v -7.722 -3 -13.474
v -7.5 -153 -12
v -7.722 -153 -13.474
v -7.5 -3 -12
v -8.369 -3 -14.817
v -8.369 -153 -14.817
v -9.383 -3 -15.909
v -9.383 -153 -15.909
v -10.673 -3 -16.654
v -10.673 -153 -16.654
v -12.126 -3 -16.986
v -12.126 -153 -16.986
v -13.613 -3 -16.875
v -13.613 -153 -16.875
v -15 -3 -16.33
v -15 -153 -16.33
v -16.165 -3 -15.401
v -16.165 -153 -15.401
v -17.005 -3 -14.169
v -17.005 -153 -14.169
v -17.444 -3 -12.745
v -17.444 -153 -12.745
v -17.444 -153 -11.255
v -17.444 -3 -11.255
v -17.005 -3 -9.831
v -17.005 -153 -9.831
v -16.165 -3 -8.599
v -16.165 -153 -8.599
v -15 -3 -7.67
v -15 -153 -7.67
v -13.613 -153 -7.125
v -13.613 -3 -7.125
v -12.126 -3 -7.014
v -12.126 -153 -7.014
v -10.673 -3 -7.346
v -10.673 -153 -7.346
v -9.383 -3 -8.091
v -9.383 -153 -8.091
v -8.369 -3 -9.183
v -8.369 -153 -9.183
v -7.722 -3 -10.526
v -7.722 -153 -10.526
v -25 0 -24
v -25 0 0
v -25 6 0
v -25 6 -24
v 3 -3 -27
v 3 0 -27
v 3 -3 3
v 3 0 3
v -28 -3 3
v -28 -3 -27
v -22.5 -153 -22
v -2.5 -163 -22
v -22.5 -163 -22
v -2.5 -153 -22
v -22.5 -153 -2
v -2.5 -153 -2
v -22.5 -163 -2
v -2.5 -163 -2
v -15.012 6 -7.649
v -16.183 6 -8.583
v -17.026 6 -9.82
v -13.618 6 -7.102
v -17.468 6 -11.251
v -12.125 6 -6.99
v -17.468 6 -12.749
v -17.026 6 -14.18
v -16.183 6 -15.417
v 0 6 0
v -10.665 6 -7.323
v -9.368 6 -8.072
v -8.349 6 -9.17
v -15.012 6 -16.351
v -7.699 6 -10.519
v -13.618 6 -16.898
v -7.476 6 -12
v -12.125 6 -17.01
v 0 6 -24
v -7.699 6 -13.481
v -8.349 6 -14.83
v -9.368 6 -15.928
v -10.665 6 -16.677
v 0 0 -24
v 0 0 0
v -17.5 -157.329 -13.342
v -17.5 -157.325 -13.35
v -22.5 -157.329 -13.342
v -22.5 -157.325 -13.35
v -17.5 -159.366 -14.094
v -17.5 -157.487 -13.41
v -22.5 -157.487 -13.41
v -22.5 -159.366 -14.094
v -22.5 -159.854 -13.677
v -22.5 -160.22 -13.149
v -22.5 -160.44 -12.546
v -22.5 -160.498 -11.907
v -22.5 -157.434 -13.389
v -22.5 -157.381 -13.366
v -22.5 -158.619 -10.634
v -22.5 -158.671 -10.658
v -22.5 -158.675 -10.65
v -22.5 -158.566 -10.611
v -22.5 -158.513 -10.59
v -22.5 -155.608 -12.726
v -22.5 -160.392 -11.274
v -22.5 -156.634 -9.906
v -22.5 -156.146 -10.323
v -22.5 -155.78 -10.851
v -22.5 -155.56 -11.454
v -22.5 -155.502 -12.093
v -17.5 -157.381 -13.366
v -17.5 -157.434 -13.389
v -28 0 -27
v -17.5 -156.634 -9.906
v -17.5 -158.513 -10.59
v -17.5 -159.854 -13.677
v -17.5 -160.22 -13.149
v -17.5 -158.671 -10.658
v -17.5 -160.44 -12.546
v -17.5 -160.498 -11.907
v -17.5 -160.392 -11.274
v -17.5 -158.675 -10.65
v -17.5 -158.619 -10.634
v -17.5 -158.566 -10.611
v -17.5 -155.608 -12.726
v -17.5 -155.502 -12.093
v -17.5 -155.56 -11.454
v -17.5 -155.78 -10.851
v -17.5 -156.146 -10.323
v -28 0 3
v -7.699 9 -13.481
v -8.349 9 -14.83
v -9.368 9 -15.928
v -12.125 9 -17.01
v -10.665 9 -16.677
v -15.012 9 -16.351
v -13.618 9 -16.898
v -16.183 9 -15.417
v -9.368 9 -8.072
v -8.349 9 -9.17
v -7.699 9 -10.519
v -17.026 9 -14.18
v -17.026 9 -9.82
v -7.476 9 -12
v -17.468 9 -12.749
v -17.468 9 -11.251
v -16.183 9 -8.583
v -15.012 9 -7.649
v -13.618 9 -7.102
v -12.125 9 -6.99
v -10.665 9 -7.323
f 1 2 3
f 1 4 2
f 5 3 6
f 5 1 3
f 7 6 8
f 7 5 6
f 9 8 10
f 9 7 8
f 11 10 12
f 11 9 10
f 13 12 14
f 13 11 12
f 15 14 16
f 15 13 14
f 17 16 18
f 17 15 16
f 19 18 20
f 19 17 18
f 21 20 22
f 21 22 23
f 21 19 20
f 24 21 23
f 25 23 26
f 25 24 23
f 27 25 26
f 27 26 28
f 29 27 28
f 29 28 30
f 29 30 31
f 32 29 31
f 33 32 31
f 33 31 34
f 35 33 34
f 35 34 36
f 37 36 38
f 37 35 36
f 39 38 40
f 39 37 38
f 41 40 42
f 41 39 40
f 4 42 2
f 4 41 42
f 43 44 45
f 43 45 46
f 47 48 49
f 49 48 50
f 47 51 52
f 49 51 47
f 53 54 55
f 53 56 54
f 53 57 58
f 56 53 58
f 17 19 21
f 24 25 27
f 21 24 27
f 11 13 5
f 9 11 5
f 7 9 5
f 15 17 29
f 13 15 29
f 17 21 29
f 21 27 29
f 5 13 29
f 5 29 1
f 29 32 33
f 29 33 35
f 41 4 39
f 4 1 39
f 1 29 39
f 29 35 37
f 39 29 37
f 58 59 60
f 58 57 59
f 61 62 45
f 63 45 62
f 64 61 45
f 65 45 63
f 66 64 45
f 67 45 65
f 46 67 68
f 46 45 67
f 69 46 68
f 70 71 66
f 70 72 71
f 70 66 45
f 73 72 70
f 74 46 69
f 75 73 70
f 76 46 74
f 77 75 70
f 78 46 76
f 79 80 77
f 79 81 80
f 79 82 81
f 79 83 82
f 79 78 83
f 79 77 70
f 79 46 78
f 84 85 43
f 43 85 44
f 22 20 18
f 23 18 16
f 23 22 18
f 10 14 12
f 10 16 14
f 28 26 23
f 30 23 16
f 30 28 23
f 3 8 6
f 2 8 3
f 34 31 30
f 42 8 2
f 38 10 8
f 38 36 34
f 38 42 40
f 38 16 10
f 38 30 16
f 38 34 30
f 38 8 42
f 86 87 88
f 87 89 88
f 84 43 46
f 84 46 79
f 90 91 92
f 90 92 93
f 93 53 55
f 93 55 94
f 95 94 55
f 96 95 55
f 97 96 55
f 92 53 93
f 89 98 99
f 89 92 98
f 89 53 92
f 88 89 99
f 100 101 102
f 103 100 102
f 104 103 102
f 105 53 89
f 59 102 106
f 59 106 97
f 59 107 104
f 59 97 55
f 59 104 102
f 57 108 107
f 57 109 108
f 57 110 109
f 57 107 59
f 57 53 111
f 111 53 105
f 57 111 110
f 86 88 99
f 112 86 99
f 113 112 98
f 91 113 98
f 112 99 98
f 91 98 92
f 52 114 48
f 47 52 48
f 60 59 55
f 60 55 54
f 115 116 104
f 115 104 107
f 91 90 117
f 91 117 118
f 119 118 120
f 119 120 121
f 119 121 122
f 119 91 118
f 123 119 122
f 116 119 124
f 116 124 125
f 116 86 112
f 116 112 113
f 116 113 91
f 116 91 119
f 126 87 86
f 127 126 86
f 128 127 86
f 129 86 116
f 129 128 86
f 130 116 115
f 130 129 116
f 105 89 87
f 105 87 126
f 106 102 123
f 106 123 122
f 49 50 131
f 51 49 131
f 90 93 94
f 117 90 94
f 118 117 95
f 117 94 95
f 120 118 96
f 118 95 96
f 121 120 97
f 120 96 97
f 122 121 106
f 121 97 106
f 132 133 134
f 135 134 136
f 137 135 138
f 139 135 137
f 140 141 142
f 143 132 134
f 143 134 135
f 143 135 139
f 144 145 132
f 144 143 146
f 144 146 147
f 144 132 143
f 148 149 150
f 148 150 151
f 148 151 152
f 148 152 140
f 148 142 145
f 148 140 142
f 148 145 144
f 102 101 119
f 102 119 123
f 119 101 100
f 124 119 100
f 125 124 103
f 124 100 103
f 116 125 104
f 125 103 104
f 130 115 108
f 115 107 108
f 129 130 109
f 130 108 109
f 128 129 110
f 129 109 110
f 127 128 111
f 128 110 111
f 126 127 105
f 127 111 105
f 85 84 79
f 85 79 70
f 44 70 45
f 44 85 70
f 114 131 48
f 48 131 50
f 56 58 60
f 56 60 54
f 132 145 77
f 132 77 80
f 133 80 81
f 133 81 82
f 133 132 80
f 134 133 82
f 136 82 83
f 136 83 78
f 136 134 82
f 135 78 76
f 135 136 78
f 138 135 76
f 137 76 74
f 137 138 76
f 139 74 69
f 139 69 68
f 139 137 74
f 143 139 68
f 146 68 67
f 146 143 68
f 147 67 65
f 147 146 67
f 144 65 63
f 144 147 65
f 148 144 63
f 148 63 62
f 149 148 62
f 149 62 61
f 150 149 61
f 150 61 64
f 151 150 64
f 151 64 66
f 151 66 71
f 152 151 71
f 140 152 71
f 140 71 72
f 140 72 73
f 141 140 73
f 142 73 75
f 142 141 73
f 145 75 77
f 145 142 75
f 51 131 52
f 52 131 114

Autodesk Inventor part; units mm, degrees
ref_plane "YZ Plane" through (0, 0, 0) normal (1, 0, 0) x (0, 1, 0)
ref_plane "XZ Plane" through (0, 0, 0) normal (0, 1, 0) x (-1, 0, 0)
ref_plane "XY Plane" through (0, 0, 0) normal (0, 0, 1) x (1, 0, 0)
sketch "스케치1" plane through (0, 0, 0) normal (0, 1, 0) x (-1, 0, 0)
  line L0 (0, 0) -> (25, 0)
  line L1 (25, 0) -> (25, -24)
  line L2 (25, -24) -> (0, -24)
  line L3 (0, -24) -> (0, 0)
  dimension "d0" = 25
  dimension "d1" = 24
extrude "돌출1" add sketch "스케치1" along normal blind 9
sketch "스케치2" plane through (0, 9, 0) normal (0, 1, 0) x (1, 0, 0)
  line L0 (-25, 0) -> (0, 24) construction
  line L1 (-25, 24) -> (0, 0) construction
  circle A0 centre (-12.5, 12) radius 5.024
  circle A1 centre (-12.5, 12) radius 5.024
  line L2 (-25, 0) -> (0, 0)
  line L3 (0, 0) -> (0, 24)
  line L4 (0, 24) -> (-25, 24)
  line L5 (-25, 24) -> (-25, 0)
extrude "돌출2" cut sketch "스케치2" against normal blind 3
sketch "스케치3" plane through (0, 0, 0) normal (0, -1, 0) x (1, 0, 0)
  line L0 (-28, -27) -> (3, -27)
  line L1 (3, -27) -> (3, 3)
  line L2 (3, 3) -> (-28, 3)
  line L3 (-28, 3) -> (-28, -27)
  line L4 (-25, -24) -> (-25, 0) projected
  line L5 (-25, 0) -> (0, 0) projected
  line L6 (0, -24) -> (-25, -24) projected
  line L7 (0, 0) -> (0, -24) projected
  dimension "d6" = 3
  dimension "d7" = 3
  dimension "d8" = 3
  dimension "d9" = 3
extrude "돌출3" add sketch "스케치3" along normal blind 3 separate body contours L3 L2 L1 L0 | L4 L5 L7 L6
sketch "스케치4" plane through (0, -3, 0) normal (0, -1, 0) x (1, 0, 0)
  line L0 (-28, 3) -> (-28, -27) projected
  line L1 (-28, -27) -> (3.0102, 3)
  line L2 (3, -27) -> (3, 3) projected
  line L3 (3, -27) -> (-28, 3)
  circle A0 centre (-12.5, -12) radius 5
  point P0 (0, 0)
  dimension "d12" = 10
extrude "돌출4" add sketch "스케치4" along normal blind 150 separate body contours A0 L1 L3 | L3 L1 A0 | L1 L3 A0 | L1 A0 L3
sketch "스케치5" plane through (-12.5, -153, -12) normal (0, -1, 0) x (1, 0, 0)
  line L0 (0, 0) -> (10, 0)
  line L1 (10, 0) -> (10, -10)
  line L2 (10, -10) -> (0, -10)
  line L3 (0, -10) -> (0, 0)
  line L4 (10, -10) -> (-10, -10)
  line L5 (-10, -10) -> (-10, 10)
  line L6 (-10, 10) -> (10, 10)
  line L7 (10, 10) -> (10, -10)
  point P0 (12.5, 12)
  dimension "d15" = 10
  dimension "d16" = 10
  dimension "d17" = 20
  dimension "d18" = 20
extrude "돌출5" add sketch "스케치5" along normal blind 10 separate body
sketch "스케치6" plane through (-22.5, -153, -22) normal (-1, 0, 0) x (0, 0, 1)
  line L0 (0, -10) -> (20, -10) projected
  line L1 (0, 0) -> (20, -10)
  line L2 (0, 0) -> (20, 0) projected
  line L3 (20, 0) -> (0, -10)
  circle A0 centre (10, -5) radius 2.5
  circle A1 centre (10, -5) radius 1.5
  line L4 (10, -5) -> (8.5905, -4.487)
  line L5 (10, -5) -> (11.5, -5) construction
  line L6 (8.5905, -4.487) -> (7.9064, -6.3664)
  line L7 (8.5905, -4.487) -> (9.2745, -2.6076)
  line L8 (10, -5) -> (11.4095, -5.513)
  line L9 (11.4095, -5.513) -> (12.0936, -3.6336)
  line L10 (11.4095, -5.513) -> (10.7255, -7.3924)
  point P0 (22, 153)
  point P1 (8.6584, -4.3292)
  point P2 (11.3505, -5.6752)
  point P3 (11.3416, -5.6708)
  point P4 (8.6495, -4.3248)
  dimension "d21" = 5
  dimension "d22" = 3
  dimension "d23" = 160
extrude "돌출6" cut sketch "스케치6" against normal blind 5 contours L6 A1 L3 | L3 A1 L1 L10 A0 L6 | A1 L4 L3 | L3 L1 A1 | A1 L1 L4 | L7 A0 L9 L3 A1 L1 | L1 L8 A1 | L8 L3 A1 | A1 L3 L9 | L1 A1 L3 bodies 4
properties part number "camera assembly"
